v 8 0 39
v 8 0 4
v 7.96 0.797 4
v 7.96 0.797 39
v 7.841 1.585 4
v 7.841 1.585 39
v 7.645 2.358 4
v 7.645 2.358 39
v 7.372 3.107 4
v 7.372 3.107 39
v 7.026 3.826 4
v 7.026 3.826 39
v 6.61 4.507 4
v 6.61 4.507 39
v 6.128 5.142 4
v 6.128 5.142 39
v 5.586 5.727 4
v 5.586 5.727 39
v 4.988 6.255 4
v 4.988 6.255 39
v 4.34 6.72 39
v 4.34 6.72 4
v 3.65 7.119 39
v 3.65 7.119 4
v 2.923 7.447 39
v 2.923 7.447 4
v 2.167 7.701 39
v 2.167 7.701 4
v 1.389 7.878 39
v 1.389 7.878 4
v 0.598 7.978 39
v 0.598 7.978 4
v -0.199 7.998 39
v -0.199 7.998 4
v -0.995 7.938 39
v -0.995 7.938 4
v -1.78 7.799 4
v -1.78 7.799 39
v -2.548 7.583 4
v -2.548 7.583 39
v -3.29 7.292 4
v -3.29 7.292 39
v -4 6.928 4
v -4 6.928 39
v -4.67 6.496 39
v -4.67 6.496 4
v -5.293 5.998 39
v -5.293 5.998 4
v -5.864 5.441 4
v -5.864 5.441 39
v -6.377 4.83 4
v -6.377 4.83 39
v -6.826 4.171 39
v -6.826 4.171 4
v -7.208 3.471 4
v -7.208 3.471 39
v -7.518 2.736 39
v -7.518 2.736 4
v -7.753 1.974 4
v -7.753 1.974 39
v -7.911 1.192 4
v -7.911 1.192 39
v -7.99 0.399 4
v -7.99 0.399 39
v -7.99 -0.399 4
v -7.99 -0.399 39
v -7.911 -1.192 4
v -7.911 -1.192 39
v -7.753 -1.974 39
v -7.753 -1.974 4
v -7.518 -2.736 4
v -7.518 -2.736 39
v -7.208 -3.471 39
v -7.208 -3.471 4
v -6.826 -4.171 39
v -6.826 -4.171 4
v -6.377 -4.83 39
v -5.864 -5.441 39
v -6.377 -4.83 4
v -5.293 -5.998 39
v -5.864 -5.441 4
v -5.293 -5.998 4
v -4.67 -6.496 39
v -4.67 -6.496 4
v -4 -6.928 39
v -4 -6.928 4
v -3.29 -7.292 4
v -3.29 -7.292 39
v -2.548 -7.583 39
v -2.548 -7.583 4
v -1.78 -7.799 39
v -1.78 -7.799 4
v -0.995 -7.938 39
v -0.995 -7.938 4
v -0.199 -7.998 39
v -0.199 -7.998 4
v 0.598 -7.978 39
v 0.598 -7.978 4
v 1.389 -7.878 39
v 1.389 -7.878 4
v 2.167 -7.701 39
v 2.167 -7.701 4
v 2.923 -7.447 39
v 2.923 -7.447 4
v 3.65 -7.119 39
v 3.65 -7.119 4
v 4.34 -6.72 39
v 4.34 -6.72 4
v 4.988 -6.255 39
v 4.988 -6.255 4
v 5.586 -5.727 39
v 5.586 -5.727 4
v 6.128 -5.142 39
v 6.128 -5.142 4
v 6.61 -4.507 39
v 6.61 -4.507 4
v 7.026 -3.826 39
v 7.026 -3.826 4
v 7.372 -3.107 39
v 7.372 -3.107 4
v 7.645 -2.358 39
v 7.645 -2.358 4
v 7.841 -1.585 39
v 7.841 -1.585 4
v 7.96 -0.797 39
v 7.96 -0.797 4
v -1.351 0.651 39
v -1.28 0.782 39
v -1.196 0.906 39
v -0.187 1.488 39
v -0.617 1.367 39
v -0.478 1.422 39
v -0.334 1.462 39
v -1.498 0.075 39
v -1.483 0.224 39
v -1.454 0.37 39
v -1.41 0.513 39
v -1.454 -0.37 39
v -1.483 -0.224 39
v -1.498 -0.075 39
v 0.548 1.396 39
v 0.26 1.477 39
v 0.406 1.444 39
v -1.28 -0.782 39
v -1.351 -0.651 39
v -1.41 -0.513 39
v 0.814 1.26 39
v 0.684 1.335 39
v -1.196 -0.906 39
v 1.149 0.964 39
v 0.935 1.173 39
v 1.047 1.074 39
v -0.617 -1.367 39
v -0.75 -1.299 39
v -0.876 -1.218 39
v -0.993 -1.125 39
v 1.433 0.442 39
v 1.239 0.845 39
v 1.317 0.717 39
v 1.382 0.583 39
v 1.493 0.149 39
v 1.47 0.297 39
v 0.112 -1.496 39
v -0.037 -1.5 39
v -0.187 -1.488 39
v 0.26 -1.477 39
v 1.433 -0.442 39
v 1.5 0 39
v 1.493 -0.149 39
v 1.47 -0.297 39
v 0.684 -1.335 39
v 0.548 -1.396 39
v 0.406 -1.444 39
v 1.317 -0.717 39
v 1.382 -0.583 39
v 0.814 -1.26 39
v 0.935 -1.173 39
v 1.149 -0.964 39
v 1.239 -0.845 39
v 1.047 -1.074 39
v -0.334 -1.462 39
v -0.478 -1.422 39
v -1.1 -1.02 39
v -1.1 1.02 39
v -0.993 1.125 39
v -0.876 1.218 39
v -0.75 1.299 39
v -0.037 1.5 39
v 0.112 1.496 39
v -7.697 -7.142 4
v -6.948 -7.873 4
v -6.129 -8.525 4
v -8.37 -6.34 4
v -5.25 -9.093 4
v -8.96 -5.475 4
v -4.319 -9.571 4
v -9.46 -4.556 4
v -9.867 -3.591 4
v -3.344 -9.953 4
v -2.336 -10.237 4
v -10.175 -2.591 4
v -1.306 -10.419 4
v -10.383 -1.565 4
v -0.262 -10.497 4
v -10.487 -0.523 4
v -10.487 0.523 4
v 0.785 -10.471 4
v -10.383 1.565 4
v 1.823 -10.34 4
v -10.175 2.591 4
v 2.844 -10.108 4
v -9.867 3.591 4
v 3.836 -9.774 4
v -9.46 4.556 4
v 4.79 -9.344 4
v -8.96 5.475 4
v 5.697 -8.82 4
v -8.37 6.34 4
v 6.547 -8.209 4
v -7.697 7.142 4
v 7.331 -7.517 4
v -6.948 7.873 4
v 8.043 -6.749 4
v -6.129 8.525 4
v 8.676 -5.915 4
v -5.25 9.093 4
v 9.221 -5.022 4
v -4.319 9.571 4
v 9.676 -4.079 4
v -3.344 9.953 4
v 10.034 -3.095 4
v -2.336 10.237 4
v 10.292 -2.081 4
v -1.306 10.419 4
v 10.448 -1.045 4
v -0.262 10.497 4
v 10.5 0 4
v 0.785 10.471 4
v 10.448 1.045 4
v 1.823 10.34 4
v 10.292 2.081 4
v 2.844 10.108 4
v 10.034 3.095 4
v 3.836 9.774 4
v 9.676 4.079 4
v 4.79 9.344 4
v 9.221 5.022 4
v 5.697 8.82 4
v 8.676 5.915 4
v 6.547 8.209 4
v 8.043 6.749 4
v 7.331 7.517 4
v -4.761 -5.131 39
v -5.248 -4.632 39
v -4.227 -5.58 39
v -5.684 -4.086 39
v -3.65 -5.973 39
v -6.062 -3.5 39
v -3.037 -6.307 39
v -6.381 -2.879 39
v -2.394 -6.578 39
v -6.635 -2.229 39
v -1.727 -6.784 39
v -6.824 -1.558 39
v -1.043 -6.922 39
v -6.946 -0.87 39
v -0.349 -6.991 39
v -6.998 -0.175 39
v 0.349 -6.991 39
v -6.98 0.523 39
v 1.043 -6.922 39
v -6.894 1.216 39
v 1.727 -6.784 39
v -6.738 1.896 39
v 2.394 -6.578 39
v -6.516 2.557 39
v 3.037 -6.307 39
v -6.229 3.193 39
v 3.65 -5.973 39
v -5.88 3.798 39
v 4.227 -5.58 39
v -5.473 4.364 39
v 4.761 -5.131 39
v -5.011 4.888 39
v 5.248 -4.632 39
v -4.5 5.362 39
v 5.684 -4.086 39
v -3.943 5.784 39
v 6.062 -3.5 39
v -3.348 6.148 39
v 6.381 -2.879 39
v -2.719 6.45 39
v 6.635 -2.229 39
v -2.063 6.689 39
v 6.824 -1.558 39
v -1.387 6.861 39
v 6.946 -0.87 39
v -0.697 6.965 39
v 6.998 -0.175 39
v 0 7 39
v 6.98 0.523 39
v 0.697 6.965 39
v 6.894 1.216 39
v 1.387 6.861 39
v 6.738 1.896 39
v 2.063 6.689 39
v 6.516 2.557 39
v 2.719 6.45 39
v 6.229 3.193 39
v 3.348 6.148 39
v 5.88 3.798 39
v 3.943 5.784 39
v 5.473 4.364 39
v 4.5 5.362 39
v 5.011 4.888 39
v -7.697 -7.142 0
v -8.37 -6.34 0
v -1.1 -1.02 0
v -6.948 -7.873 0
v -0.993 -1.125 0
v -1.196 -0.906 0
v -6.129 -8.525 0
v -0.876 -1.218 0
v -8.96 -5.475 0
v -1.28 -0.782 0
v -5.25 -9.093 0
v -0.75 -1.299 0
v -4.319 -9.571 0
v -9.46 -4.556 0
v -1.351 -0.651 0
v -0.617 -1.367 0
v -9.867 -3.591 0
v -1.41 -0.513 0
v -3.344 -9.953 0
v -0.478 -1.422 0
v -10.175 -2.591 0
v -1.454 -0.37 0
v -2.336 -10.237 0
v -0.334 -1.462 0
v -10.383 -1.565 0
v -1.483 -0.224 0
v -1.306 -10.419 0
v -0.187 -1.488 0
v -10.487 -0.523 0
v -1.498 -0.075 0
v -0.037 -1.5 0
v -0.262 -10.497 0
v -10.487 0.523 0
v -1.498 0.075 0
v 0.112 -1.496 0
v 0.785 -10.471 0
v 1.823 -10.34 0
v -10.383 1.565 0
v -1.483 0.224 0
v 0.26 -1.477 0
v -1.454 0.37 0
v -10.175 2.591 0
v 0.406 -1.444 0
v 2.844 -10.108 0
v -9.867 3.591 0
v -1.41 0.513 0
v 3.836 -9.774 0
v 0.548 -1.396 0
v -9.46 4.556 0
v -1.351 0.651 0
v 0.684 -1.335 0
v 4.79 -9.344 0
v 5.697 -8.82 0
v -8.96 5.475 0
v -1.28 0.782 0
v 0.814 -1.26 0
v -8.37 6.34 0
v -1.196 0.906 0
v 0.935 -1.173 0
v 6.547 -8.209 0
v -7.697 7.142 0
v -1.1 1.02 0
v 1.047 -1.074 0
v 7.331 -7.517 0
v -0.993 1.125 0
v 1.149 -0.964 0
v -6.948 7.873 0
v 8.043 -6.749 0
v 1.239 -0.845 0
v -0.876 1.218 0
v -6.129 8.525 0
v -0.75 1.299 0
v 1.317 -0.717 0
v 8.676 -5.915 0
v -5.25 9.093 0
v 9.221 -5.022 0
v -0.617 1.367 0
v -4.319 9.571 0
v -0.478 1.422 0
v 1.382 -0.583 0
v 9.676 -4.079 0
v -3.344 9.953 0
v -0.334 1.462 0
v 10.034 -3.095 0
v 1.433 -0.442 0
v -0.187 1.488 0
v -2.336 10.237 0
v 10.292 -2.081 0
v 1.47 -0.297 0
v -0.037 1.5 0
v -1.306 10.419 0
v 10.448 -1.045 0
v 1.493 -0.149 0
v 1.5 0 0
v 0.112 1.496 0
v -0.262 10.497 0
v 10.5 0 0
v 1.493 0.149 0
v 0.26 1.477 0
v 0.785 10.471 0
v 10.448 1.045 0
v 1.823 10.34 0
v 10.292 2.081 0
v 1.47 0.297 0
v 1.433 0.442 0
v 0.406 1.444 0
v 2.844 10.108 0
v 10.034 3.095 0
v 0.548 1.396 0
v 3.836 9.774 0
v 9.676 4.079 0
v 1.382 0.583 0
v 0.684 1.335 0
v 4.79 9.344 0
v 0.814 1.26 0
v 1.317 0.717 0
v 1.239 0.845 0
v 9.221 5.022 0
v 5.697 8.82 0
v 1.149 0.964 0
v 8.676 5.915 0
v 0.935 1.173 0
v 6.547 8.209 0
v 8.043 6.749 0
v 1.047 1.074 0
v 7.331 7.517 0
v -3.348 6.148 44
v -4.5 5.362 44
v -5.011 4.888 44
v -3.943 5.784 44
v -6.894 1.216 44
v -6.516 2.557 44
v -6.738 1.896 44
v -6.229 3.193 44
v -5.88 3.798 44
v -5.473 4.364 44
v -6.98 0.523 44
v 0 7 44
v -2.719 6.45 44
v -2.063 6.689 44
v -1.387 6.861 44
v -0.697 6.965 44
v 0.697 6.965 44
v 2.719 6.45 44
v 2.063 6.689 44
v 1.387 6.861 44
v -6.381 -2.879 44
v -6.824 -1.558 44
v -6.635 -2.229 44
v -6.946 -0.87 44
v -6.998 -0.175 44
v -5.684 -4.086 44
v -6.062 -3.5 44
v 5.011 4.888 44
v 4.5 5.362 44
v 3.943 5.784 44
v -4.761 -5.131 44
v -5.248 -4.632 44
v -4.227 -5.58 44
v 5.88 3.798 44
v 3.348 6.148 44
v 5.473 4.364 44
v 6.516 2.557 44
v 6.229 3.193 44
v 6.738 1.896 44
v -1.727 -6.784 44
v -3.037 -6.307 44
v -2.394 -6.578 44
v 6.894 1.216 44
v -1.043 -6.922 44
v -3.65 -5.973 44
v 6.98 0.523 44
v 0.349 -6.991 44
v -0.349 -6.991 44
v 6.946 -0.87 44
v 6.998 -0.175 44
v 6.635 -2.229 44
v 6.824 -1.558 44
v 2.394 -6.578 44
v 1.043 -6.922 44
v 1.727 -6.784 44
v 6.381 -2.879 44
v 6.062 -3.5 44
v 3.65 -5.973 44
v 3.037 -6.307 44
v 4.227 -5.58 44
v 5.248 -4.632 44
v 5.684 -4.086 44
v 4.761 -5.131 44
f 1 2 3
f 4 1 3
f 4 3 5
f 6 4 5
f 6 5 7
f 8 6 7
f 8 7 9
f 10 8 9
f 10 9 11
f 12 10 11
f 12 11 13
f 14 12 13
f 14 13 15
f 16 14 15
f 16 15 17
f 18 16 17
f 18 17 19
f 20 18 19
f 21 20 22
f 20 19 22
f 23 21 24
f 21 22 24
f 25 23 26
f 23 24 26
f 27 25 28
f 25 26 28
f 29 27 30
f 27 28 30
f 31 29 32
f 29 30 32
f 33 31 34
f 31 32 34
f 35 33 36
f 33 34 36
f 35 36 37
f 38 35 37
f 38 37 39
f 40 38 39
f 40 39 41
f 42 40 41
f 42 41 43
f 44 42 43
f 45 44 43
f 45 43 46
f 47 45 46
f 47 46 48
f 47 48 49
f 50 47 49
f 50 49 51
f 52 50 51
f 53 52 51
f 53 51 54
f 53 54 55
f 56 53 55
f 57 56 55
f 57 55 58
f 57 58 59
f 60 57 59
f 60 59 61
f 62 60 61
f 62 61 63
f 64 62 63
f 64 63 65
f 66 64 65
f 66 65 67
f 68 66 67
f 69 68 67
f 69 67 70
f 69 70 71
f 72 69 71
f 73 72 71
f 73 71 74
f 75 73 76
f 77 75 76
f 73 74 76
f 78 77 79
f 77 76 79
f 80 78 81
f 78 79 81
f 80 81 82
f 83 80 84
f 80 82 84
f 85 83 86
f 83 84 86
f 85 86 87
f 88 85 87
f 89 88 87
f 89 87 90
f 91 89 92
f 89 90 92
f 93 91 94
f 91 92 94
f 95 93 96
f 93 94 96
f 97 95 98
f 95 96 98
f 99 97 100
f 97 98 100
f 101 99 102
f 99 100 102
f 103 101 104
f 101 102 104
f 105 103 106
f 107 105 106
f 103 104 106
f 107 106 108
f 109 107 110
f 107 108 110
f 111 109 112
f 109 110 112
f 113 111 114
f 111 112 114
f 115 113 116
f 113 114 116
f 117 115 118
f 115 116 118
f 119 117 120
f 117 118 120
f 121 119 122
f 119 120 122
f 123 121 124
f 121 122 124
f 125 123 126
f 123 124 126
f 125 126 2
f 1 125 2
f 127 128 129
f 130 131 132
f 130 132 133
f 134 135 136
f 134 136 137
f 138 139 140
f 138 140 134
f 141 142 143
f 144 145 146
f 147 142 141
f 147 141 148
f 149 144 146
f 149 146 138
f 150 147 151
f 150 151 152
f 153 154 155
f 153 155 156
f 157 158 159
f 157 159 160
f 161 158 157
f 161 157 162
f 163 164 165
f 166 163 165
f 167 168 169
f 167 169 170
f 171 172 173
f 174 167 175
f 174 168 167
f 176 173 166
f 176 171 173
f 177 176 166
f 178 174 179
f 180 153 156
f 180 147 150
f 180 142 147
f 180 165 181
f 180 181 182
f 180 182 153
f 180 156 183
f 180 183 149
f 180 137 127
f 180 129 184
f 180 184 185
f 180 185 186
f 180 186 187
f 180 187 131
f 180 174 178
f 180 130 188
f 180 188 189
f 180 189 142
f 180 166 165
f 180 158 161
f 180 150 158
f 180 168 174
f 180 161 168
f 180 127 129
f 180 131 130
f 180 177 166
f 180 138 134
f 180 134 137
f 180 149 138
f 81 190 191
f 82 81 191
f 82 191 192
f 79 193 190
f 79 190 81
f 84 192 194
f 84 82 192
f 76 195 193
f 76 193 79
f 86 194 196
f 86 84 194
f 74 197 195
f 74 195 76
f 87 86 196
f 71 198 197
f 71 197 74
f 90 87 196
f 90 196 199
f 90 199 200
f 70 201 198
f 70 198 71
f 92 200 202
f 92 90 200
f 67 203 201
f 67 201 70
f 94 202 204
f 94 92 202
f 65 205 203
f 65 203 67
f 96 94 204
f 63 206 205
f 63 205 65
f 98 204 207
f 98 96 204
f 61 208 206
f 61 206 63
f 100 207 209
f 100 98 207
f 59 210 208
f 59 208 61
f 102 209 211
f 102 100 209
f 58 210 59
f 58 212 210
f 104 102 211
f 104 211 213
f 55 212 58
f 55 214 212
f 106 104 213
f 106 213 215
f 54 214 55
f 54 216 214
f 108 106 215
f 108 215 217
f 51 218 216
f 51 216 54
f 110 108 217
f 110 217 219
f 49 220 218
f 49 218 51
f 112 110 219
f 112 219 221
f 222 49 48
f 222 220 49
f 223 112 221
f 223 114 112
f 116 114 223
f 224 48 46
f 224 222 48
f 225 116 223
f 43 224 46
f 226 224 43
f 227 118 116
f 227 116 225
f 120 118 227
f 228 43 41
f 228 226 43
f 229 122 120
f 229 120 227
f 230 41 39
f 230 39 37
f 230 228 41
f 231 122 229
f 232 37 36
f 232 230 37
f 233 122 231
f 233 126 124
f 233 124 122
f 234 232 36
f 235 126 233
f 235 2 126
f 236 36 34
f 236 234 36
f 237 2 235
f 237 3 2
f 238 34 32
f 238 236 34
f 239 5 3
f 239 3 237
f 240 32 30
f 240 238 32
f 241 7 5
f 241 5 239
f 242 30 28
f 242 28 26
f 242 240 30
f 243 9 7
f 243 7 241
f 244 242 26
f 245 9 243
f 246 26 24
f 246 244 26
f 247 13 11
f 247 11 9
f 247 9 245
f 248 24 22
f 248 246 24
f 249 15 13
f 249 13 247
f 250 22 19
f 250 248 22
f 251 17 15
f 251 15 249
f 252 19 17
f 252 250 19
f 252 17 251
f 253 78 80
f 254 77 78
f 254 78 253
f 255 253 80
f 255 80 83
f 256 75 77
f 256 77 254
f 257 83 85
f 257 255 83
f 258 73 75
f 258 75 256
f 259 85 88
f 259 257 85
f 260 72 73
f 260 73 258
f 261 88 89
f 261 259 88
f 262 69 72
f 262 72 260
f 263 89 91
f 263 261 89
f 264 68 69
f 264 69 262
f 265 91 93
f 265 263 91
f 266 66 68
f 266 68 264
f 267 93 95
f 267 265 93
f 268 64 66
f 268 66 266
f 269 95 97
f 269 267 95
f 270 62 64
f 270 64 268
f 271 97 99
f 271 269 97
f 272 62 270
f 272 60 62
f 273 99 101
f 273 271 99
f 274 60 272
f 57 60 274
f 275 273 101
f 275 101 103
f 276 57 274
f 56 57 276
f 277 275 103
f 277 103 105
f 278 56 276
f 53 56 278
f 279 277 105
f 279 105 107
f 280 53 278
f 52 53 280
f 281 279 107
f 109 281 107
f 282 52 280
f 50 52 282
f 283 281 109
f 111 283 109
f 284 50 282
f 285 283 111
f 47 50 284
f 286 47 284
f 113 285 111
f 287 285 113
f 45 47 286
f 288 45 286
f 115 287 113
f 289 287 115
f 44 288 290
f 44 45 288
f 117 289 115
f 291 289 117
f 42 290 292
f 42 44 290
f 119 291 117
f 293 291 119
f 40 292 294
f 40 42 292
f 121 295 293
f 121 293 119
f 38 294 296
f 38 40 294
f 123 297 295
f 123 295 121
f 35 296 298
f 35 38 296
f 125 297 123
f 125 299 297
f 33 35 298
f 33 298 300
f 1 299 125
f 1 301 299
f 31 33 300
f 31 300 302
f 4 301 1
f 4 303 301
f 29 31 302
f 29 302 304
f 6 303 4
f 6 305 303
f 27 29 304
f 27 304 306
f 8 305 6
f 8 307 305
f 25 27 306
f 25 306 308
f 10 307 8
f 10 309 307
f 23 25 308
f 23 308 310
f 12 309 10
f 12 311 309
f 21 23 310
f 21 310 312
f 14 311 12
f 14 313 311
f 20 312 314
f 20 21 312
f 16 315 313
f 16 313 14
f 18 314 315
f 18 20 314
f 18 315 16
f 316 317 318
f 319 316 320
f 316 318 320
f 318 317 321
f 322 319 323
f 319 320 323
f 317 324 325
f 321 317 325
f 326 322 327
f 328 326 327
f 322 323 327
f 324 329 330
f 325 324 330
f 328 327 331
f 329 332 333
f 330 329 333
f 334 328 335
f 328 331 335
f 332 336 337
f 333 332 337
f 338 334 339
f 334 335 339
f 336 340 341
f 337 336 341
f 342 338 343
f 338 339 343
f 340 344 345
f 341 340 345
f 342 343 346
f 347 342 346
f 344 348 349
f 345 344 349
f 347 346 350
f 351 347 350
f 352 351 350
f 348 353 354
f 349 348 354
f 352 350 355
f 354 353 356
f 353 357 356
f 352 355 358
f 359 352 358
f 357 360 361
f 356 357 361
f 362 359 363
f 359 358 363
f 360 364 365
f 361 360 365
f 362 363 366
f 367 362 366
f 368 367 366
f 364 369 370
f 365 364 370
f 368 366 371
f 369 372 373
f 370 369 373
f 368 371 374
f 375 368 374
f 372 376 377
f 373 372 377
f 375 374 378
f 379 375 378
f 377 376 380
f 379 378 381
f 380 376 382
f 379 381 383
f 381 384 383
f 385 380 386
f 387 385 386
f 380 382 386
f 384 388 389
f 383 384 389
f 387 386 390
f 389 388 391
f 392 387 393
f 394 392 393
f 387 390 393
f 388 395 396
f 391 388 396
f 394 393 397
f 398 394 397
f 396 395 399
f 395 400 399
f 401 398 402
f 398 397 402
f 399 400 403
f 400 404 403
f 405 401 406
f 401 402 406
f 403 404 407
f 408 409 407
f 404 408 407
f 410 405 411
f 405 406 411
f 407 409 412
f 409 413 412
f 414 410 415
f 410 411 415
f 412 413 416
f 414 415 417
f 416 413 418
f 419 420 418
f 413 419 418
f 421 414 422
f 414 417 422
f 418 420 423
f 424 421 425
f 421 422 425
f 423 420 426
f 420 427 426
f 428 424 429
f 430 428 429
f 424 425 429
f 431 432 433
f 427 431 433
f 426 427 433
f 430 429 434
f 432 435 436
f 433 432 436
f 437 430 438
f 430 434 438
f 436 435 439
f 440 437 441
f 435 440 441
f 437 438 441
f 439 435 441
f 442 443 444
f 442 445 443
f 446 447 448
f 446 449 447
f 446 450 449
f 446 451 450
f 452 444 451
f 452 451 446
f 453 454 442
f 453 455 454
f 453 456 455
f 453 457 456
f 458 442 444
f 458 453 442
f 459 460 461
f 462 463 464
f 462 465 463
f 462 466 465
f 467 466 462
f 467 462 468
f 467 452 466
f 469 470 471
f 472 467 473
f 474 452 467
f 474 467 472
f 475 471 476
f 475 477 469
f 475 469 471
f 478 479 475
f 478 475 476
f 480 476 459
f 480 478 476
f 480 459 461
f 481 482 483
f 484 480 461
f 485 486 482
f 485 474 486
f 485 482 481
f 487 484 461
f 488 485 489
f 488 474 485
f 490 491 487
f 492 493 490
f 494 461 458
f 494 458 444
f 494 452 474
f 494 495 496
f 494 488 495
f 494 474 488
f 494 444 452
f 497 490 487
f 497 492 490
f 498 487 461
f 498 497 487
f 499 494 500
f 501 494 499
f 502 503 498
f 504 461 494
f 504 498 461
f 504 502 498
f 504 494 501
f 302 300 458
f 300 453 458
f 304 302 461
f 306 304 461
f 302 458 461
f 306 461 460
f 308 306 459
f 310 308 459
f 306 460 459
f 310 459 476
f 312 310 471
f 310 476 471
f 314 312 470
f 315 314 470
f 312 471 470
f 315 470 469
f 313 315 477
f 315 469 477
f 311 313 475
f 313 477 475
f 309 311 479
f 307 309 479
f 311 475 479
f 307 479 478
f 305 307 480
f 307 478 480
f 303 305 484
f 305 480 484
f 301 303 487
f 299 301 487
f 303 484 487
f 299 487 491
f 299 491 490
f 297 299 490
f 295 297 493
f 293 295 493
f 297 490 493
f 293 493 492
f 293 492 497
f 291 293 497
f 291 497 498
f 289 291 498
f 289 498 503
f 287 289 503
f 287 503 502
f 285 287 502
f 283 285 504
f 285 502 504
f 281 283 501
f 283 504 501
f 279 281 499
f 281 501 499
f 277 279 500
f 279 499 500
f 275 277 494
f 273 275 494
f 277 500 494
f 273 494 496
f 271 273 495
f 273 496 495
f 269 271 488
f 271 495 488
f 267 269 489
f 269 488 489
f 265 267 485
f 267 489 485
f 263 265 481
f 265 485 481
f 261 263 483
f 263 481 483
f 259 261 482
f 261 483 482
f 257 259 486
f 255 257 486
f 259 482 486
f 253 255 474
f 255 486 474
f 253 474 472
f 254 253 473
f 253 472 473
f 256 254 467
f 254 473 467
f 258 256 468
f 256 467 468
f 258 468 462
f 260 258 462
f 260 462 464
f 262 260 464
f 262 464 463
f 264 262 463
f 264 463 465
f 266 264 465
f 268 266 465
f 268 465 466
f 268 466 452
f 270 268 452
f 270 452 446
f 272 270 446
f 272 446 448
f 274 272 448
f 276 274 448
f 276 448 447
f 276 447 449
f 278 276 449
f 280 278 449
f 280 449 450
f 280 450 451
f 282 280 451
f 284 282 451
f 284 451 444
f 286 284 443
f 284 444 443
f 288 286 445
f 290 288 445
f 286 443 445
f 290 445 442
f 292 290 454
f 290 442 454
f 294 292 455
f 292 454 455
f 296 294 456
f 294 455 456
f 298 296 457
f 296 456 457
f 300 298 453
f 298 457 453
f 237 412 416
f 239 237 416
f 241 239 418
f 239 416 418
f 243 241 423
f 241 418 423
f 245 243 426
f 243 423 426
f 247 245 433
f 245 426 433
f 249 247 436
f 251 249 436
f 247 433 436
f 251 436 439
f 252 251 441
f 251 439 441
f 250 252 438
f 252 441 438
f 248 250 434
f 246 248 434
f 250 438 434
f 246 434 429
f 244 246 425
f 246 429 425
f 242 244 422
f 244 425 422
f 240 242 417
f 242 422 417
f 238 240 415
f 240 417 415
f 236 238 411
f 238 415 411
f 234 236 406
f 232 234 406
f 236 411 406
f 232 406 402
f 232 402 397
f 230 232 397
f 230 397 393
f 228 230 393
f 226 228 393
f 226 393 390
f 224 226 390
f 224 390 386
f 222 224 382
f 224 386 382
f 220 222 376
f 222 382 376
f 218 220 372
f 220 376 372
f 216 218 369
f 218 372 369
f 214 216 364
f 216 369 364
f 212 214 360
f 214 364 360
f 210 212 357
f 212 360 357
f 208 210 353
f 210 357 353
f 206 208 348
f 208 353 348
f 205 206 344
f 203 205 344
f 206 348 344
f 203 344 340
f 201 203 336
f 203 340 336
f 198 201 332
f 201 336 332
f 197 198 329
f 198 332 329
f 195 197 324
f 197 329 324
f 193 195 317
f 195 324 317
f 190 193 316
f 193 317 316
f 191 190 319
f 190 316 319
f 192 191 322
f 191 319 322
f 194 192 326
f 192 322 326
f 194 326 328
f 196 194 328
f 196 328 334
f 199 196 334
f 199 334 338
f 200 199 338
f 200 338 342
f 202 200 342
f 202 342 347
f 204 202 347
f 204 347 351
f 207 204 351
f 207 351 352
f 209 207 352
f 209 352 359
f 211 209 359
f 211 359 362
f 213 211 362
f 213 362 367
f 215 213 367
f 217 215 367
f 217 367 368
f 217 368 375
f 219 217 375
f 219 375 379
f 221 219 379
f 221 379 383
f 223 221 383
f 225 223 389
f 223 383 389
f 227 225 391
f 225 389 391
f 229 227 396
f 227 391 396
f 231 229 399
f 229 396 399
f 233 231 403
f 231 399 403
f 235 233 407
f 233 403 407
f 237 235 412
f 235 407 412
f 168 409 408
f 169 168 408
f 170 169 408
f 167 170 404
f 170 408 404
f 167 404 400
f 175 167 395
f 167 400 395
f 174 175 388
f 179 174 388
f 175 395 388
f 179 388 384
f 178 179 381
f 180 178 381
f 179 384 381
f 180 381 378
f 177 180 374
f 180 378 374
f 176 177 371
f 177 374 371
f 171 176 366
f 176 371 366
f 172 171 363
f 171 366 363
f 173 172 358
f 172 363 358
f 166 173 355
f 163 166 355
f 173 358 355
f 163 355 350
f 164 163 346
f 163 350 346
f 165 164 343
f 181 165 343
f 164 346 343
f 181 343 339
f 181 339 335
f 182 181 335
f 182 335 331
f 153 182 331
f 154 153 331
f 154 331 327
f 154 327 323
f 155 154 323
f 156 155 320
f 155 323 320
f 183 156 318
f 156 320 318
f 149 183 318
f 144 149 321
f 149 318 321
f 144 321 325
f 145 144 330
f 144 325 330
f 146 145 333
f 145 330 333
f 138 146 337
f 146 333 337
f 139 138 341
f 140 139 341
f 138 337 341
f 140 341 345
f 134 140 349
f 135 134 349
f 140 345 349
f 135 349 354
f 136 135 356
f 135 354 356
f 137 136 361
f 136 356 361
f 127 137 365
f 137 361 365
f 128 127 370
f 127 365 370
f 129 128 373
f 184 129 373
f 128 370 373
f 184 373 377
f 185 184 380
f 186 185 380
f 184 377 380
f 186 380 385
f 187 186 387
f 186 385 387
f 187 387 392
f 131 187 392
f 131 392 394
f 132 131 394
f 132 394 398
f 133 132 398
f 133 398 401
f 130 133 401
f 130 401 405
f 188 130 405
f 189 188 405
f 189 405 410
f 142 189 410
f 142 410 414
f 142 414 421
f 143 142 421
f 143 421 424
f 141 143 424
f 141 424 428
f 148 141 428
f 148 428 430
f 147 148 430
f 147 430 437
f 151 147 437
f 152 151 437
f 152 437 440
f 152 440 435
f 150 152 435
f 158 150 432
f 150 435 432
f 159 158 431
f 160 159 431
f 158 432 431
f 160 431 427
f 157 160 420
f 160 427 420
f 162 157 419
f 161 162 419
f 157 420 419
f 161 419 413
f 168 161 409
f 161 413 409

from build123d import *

# Parameters (mm, degrees)
F0_R     = 10.5
F1_DEPTH = 4
F2_R     = 8
F3_DEPTH = 39
F4_W     = 7
F4_H     = 5
F6_R     = 1.5
F7_DEPTH = 39


with BuildPart() as f1:
    # F0 (on Top) → F1 (new body)
    with BuildSketch(Plane.XY):
        Circle(F0_R)
    extrude(amount=F1_DEPTH)

    # F2 (on Top) → F3 (join)
    with BuildSketch(Plane.XY):
        Circle(F2_R)
    extrude(amount=F3_DEPTH)

    # F4 (on Right) → F5 (revolve)
    with BuildSketch(Plane.YZ):
        with Locations((3.5, 41.5)):
            Rectangle(F4_W, F4_H)
    revolve(axis=Axis((0, 0, 41.5), (0, 0, -1)))

    # F6 (on face) → F7 (cut)
    with BuildSketch(Plane(origin=(0, 0, 0), x_dir=(1, 0, 0), z_dir=(0, 0, -1))):
        Circle(F6_R)
    extrude(amount=-F7_DEPTH, mode=Mode.SUBTRACT)


solid = f1.part
